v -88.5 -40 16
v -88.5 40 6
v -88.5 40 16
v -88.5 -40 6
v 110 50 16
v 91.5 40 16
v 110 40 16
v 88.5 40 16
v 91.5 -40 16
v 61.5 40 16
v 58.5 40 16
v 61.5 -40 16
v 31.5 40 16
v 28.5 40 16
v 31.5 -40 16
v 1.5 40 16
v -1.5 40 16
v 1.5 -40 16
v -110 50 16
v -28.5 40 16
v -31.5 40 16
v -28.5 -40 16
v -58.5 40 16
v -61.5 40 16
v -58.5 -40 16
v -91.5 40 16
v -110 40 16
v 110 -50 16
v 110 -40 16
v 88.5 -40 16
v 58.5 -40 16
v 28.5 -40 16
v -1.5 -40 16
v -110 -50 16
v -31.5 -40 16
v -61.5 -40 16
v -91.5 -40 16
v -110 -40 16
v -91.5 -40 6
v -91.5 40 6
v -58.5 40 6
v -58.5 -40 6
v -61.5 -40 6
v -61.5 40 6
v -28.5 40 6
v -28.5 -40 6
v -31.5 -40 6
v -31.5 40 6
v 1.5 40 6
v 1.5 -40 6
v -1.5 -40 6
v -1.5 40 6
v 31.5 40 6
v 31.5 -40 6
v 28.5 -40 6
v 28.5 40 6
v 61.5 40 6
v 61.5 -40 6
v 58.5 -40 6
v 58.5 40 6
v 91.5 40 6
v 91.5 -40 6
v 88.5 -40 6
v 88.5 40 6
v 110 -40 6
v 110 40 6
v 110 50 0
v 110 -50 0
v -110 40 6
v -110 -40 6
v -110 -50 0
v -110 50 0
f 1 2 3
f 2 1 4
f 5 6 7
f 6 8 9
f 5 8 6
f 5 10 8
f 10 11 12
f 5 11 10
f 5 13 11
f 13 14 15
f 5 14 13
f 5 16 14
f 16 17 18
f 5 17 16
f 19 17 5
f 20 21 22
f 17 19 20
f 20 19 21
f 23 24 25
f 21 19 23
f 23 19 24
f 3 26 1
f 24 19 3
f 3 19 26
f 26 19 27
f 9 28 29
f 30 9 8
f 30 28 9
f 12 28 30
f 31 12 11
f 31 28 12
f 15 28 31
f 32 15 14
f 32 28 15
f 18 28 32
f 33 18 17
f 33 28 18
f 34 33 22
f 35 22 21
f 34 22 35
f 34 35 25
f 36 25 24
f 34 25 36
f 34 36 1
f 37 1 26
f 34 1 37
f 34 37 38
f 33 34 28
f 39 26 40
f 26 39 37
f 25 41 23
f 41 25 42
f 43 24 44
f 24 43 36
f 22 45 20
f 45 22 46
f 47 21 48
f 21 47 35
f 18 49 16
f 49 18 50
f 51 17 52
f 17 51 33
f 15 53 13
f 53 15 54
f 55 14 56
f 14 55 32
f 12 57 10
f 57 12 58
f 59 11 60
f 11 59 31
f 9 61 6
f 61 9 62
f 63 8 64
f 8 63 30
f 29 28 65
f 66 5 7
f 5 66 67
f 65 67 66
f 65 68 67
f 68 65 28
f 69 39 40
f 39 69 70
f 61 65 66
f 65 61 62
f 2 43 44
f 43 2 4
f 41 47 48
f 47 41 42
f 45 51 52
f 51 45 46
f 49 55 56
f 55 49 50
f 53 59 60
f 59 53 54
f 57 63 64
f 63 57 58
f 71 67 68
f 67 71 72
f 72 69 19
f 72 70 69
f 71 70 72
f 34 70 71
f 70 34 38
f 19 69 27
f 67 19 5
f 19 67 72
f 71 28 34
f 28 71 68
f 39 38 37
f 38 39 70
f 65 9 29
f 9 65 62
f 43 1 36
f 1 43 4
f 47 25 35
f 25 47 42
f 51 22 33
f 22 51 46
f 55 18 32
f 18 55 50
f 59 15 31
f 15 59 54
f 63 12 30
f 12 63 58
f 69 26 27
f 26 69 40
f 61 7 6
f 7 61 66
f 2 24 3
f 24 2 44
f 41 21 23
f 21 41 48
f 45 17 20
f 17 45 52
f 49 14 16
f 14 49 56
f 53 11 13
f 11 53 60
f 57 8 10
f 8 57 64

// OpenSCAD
$fn = 32;

// ----------------------------------------------------------------------
// Rib frame 220 x 100 x 16
// 7 ribs at 30 mm pitch
// ----------------------------------------------------------------------

// --- parameters (mm) ---
frame = [220, 100, 6];  // base plate size (x, y, z)
rail_w = 10;            // side rail width
ribs = 7;               // number of ribs
rib_t = 3;              // rib thickness
rib_h = 10;             // rib height above the base plate
pitch = 30;             // pitch between rib centres

// --- derived feature positions (mm) ---
span = (ribs - 1) * pitch;          // = 180   distance between the outer ribs
origin_x = -span / 2;               // = -90   X of the first rib
rib_len = frame[1] - 2 * rail_w + 2;  // = 82   rib length, 1 mm into each rail
feature_centers = [
  [origin_x + 0 * pitch, 0],
  [origin_x + 1 * pitch, 0],
  [origin_x + 2 * pitch, 0],
  [origin_x + 3 * pitch, 0],
  [origin_x + 4 * pitch, 0],
  [origin_x + 5 * pitch, 0],
  [origin_x + 6 * pitch, 0]
];   // rib centre line, drives the rib loop

// base plate, two side rails, then the ribs read straight off feature_centers
union() {
  translate([-frame[0] / 2, -frame[1] / 2, 0]) cube(frame);
  translate([-frame[0] / 2, -frame[1] / 2, 0]) cube([frame[0], rail_w, frame[2] + rib_h]);
  translate([-frame[0] / 2, frame[1] / 2 - rail_w, 0]) cube([frame[0], rail_w, frame[2] + rib_h]);
  for (centre = feature_centers)
    translate([centre[0] - rib_t / 2, centre[1] - rib_len / 2, frame[2] - 1])
      cube([rib_t, rib_len, rib_h + 1]);
}
